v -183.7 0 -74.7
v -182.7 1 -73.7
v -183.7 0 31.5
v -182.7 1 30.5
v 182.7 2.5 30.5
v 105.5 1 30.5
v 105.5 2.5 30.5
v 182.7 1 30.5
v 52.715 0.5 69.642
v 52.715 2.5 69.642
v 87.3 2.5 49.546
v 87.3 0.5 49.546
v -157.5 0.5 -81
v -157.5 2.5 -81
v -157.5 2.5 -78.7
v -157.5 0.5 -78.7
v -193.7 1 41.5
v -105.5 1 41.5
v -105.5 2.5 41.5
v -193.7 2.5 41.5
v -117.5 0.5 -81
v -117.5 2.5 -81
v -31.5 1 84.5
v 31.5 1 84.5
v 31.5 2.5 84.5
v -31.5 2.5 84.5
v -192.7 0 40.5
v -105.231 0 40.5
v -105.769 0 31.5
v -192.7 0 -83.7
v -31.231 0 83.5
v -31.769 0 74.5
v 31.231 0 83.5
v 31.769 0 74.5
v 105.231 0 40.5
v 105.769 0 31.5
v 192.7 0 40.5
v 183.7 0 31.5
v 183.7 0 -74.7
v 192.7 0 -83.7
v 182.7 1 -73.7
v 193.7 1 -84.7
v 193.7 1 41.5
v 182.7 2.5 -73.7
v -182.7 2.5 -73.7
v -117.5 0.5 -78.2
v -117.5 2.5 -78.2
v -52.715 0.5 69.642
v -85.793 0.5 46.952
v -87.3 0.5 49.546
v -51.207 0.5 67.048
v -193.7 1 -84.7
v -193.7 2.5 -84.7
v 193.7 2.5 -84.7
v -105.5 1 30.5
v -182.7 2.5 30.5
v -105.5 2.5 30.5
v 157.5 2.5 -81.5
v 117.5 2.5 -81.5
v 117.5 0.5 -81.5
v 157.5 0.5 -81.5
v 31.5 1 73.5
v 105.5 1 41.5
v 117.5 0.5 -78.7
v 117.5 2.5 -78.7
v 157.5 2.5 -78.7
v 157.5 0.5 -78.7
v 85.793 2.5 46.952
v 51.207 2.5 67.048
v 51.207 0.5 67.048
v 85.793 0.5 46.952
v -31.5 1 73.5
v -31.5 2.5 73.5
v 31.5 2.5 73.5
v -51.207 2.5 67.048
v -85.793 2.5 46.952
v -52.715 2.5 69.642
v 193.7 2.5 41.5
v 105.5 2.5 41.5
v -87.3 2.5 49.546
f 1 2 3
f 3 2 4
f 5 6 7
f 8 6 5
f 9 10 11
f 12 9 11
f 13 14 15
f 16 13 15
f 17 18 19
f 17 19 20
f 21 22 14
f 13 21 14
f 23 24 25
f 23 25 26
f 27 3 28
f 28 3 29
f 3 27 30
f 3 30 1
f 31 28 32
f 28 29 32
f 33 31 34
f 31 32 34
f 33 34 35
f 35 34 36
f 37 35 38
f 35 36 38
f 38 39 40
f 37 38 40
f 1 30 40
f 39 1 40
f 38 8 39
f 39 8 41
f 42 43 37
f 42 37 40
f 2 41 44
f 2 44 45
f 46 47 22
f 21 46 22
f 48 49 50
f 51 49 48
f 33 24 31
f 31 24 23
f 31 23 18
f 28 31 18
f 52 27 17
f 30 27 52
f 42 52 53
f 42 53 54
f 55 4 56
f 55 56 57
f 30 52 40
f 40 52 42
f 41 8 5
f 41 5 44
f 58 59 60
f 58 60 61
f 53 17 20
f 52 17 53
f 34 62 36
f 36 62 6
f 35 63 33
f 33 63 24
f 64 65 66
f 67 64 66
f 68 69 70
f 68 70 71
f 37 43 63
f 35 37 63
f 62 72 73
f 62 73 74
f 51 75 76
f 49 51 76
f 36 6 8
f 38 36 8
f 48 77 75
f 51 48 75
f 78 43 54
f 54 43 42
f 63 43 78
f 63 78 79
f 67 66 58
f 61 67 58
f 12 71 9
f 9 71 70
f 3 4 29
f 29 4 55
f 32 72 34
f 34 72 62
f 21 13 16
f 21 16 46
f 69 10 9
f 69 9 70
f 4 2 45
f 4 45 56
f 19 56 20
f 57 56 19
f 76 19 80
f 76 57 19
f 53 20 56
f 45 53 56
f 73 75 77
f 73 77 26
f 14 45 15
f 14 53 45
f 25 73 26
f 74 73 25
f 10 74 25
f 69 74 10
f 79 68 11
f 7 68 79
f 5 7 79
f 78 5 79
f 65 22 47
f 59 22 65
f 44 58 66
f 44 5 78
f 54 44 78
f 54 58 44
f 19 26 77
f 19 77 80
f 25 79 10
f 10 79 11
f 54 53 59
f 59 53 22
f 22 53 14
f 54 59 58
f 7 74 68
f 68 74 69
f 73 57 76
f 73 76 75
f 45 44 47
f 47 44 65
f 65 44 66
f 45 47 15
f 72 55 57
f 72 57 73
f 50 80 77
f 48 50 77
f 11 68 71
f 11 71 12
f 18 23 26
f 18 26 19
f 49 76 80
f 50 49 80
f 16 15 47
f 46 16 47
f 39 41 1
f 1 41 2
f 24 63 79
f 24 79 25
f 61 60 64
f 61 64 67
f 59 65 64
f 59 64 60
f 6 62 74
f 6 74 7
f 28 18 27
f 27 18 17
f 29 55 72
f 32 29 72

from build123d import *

# Parameters (mm, degrees)
SKETCH1_W           = 387.4
SKETCH1_H           = 169.4
BOSS_EXTRUDE1_DEPTH = 2.5
SKETCH3_W           = 40
SKETCH3_H           = 2.8
CUT_EXTRUDE2_DEPTH  = 2
CUT_EXTRUDE3_DEPTH  = 10
CUT_EXTRUDE4_DEPTH  = 3.5
CHAMFER1_SIZE       = 1
CHAMFER2_SIZE       = 1
CUT_EXTRUDE5_DEPTH  = 2


with BuildPart() as part:
    # Sketch1 → Boss-Extrude1 (new body)
    with BuildSketch(Plane(origin=(0, 0, 0), x_dir=(1, 0, 0), z_dir=(0, 1, 0))):
        Rectangle(SKETCH1_W, SKETCH1_H)
    extrude(amount=BOSS_EXTRUDE1_DEPTH)

    # Sketch3 → Cut-Extrude2 (cut)
    with BuildSketch(Plane(origin=(0, 2.5, 0), x_dir=(1, 0, 0), z_dir=(0, 1, 0))):
        with Locations((137.5, 80.1)):
            Rectangle(SKETCH3_W, SKETCH3_H)
        Polygon((-157.5, 81), (-157.5, 78.7), (-117.5, 78.2), (-117.5, 81), align=None)
    extrude(amount=-CUT_EXTRUDE2_DEPTH, mode=Mode.SUBTRACT)

    # Sketch4 → Cut-Extrude3 (cut)
    with BuildSketch(Plane.XZ):
        Polygon((31.499996994, 73.5), (105.5, 30.5), (182.7, 30.5), (182.7, -73.7), (-182.7, -73.7), (-182.7, 30.5), (-105.5, 30.5), (-31.499996994, 73.5), align=None)
    extrude(amount=-CUT_EXTRUDE3_DEPTH, mode=Mode.SUBTRACT)

    # Sketch7 → Cut-Extrude4 (cut, through all)
    with BuildSketch(Plane.XZ):
        Polygon((193.7, 41.5), (105.5, 41.5), (31.499996994, 84.5), (-31.499996994, 84.5), (-105.5, 41.5), (-193.7, 41.5), (-193.7, 84.7), (193.7, 84.7), align=None)
    extrude(amount=-CUT_EXTRUDE4_DEPTH, mode=Mode.SUBTRACT)

    # Chamfer1
    chamfer1_edges = [part.edges().sort_by_distance(p)[0] for p in [
        (-193.7, 0, -21.6),
        (0, 0, -84.7),
        (193.7, 0, -21.6),
        (-149.6, 0, 41.5),
        (-68.499998497, 0, 63),
        (0, 0, 84.5),
        (68.499998497, 0, 63),
        (149.6, 0, 41.5),
    ]]
    chamfer(chamfer1_edges, length=CHAMFER1_SIZE)

    # Chamfer2
    chamfer2_edges = [part.edges().sort_by_distance(p)[0] for p in [
        (0, 0, 73.5),
        (-68.499998497, 0, 52),
        (-144.1, 0, 30.5),
        (-182.7, 0, -21.6),
        (0, 0, -73.7),
        (182.7, 0, -21.6),
        (144.1, 0, 30.5),
        (68.499998497, 0, 52),
    ]]
    chamfer(chamfer2_edges, length=CHAMFER2_SIZE)

    # Sketch9 → Cut-Extrude5 (cut)
    with BuildSketch(Plane(origin=(0, 2.5, 0), x_dir=(1, 0, 0), z_dir=(0, 1, 0))):
        Polygon((-70.007252094, -59.593875696), (-52.714747454, -69.642222987), (-51.20749536, -67.048347291), (-85.79250464, -46.951652709), (-87.299756734, -49.545528405), align=None)
        Polygon((70.007252094, -59.593875696), (52.714747454, -69.642222987), (51.20749536, -67.048347291), (85.79250464, -46.951652709), (87.299756734, -49.545528405), align=None)
    extrude(amount=-CUT_EXTRUDE5_DEPTH, mode=Mode.SUBTRACT)


solid = part.part
